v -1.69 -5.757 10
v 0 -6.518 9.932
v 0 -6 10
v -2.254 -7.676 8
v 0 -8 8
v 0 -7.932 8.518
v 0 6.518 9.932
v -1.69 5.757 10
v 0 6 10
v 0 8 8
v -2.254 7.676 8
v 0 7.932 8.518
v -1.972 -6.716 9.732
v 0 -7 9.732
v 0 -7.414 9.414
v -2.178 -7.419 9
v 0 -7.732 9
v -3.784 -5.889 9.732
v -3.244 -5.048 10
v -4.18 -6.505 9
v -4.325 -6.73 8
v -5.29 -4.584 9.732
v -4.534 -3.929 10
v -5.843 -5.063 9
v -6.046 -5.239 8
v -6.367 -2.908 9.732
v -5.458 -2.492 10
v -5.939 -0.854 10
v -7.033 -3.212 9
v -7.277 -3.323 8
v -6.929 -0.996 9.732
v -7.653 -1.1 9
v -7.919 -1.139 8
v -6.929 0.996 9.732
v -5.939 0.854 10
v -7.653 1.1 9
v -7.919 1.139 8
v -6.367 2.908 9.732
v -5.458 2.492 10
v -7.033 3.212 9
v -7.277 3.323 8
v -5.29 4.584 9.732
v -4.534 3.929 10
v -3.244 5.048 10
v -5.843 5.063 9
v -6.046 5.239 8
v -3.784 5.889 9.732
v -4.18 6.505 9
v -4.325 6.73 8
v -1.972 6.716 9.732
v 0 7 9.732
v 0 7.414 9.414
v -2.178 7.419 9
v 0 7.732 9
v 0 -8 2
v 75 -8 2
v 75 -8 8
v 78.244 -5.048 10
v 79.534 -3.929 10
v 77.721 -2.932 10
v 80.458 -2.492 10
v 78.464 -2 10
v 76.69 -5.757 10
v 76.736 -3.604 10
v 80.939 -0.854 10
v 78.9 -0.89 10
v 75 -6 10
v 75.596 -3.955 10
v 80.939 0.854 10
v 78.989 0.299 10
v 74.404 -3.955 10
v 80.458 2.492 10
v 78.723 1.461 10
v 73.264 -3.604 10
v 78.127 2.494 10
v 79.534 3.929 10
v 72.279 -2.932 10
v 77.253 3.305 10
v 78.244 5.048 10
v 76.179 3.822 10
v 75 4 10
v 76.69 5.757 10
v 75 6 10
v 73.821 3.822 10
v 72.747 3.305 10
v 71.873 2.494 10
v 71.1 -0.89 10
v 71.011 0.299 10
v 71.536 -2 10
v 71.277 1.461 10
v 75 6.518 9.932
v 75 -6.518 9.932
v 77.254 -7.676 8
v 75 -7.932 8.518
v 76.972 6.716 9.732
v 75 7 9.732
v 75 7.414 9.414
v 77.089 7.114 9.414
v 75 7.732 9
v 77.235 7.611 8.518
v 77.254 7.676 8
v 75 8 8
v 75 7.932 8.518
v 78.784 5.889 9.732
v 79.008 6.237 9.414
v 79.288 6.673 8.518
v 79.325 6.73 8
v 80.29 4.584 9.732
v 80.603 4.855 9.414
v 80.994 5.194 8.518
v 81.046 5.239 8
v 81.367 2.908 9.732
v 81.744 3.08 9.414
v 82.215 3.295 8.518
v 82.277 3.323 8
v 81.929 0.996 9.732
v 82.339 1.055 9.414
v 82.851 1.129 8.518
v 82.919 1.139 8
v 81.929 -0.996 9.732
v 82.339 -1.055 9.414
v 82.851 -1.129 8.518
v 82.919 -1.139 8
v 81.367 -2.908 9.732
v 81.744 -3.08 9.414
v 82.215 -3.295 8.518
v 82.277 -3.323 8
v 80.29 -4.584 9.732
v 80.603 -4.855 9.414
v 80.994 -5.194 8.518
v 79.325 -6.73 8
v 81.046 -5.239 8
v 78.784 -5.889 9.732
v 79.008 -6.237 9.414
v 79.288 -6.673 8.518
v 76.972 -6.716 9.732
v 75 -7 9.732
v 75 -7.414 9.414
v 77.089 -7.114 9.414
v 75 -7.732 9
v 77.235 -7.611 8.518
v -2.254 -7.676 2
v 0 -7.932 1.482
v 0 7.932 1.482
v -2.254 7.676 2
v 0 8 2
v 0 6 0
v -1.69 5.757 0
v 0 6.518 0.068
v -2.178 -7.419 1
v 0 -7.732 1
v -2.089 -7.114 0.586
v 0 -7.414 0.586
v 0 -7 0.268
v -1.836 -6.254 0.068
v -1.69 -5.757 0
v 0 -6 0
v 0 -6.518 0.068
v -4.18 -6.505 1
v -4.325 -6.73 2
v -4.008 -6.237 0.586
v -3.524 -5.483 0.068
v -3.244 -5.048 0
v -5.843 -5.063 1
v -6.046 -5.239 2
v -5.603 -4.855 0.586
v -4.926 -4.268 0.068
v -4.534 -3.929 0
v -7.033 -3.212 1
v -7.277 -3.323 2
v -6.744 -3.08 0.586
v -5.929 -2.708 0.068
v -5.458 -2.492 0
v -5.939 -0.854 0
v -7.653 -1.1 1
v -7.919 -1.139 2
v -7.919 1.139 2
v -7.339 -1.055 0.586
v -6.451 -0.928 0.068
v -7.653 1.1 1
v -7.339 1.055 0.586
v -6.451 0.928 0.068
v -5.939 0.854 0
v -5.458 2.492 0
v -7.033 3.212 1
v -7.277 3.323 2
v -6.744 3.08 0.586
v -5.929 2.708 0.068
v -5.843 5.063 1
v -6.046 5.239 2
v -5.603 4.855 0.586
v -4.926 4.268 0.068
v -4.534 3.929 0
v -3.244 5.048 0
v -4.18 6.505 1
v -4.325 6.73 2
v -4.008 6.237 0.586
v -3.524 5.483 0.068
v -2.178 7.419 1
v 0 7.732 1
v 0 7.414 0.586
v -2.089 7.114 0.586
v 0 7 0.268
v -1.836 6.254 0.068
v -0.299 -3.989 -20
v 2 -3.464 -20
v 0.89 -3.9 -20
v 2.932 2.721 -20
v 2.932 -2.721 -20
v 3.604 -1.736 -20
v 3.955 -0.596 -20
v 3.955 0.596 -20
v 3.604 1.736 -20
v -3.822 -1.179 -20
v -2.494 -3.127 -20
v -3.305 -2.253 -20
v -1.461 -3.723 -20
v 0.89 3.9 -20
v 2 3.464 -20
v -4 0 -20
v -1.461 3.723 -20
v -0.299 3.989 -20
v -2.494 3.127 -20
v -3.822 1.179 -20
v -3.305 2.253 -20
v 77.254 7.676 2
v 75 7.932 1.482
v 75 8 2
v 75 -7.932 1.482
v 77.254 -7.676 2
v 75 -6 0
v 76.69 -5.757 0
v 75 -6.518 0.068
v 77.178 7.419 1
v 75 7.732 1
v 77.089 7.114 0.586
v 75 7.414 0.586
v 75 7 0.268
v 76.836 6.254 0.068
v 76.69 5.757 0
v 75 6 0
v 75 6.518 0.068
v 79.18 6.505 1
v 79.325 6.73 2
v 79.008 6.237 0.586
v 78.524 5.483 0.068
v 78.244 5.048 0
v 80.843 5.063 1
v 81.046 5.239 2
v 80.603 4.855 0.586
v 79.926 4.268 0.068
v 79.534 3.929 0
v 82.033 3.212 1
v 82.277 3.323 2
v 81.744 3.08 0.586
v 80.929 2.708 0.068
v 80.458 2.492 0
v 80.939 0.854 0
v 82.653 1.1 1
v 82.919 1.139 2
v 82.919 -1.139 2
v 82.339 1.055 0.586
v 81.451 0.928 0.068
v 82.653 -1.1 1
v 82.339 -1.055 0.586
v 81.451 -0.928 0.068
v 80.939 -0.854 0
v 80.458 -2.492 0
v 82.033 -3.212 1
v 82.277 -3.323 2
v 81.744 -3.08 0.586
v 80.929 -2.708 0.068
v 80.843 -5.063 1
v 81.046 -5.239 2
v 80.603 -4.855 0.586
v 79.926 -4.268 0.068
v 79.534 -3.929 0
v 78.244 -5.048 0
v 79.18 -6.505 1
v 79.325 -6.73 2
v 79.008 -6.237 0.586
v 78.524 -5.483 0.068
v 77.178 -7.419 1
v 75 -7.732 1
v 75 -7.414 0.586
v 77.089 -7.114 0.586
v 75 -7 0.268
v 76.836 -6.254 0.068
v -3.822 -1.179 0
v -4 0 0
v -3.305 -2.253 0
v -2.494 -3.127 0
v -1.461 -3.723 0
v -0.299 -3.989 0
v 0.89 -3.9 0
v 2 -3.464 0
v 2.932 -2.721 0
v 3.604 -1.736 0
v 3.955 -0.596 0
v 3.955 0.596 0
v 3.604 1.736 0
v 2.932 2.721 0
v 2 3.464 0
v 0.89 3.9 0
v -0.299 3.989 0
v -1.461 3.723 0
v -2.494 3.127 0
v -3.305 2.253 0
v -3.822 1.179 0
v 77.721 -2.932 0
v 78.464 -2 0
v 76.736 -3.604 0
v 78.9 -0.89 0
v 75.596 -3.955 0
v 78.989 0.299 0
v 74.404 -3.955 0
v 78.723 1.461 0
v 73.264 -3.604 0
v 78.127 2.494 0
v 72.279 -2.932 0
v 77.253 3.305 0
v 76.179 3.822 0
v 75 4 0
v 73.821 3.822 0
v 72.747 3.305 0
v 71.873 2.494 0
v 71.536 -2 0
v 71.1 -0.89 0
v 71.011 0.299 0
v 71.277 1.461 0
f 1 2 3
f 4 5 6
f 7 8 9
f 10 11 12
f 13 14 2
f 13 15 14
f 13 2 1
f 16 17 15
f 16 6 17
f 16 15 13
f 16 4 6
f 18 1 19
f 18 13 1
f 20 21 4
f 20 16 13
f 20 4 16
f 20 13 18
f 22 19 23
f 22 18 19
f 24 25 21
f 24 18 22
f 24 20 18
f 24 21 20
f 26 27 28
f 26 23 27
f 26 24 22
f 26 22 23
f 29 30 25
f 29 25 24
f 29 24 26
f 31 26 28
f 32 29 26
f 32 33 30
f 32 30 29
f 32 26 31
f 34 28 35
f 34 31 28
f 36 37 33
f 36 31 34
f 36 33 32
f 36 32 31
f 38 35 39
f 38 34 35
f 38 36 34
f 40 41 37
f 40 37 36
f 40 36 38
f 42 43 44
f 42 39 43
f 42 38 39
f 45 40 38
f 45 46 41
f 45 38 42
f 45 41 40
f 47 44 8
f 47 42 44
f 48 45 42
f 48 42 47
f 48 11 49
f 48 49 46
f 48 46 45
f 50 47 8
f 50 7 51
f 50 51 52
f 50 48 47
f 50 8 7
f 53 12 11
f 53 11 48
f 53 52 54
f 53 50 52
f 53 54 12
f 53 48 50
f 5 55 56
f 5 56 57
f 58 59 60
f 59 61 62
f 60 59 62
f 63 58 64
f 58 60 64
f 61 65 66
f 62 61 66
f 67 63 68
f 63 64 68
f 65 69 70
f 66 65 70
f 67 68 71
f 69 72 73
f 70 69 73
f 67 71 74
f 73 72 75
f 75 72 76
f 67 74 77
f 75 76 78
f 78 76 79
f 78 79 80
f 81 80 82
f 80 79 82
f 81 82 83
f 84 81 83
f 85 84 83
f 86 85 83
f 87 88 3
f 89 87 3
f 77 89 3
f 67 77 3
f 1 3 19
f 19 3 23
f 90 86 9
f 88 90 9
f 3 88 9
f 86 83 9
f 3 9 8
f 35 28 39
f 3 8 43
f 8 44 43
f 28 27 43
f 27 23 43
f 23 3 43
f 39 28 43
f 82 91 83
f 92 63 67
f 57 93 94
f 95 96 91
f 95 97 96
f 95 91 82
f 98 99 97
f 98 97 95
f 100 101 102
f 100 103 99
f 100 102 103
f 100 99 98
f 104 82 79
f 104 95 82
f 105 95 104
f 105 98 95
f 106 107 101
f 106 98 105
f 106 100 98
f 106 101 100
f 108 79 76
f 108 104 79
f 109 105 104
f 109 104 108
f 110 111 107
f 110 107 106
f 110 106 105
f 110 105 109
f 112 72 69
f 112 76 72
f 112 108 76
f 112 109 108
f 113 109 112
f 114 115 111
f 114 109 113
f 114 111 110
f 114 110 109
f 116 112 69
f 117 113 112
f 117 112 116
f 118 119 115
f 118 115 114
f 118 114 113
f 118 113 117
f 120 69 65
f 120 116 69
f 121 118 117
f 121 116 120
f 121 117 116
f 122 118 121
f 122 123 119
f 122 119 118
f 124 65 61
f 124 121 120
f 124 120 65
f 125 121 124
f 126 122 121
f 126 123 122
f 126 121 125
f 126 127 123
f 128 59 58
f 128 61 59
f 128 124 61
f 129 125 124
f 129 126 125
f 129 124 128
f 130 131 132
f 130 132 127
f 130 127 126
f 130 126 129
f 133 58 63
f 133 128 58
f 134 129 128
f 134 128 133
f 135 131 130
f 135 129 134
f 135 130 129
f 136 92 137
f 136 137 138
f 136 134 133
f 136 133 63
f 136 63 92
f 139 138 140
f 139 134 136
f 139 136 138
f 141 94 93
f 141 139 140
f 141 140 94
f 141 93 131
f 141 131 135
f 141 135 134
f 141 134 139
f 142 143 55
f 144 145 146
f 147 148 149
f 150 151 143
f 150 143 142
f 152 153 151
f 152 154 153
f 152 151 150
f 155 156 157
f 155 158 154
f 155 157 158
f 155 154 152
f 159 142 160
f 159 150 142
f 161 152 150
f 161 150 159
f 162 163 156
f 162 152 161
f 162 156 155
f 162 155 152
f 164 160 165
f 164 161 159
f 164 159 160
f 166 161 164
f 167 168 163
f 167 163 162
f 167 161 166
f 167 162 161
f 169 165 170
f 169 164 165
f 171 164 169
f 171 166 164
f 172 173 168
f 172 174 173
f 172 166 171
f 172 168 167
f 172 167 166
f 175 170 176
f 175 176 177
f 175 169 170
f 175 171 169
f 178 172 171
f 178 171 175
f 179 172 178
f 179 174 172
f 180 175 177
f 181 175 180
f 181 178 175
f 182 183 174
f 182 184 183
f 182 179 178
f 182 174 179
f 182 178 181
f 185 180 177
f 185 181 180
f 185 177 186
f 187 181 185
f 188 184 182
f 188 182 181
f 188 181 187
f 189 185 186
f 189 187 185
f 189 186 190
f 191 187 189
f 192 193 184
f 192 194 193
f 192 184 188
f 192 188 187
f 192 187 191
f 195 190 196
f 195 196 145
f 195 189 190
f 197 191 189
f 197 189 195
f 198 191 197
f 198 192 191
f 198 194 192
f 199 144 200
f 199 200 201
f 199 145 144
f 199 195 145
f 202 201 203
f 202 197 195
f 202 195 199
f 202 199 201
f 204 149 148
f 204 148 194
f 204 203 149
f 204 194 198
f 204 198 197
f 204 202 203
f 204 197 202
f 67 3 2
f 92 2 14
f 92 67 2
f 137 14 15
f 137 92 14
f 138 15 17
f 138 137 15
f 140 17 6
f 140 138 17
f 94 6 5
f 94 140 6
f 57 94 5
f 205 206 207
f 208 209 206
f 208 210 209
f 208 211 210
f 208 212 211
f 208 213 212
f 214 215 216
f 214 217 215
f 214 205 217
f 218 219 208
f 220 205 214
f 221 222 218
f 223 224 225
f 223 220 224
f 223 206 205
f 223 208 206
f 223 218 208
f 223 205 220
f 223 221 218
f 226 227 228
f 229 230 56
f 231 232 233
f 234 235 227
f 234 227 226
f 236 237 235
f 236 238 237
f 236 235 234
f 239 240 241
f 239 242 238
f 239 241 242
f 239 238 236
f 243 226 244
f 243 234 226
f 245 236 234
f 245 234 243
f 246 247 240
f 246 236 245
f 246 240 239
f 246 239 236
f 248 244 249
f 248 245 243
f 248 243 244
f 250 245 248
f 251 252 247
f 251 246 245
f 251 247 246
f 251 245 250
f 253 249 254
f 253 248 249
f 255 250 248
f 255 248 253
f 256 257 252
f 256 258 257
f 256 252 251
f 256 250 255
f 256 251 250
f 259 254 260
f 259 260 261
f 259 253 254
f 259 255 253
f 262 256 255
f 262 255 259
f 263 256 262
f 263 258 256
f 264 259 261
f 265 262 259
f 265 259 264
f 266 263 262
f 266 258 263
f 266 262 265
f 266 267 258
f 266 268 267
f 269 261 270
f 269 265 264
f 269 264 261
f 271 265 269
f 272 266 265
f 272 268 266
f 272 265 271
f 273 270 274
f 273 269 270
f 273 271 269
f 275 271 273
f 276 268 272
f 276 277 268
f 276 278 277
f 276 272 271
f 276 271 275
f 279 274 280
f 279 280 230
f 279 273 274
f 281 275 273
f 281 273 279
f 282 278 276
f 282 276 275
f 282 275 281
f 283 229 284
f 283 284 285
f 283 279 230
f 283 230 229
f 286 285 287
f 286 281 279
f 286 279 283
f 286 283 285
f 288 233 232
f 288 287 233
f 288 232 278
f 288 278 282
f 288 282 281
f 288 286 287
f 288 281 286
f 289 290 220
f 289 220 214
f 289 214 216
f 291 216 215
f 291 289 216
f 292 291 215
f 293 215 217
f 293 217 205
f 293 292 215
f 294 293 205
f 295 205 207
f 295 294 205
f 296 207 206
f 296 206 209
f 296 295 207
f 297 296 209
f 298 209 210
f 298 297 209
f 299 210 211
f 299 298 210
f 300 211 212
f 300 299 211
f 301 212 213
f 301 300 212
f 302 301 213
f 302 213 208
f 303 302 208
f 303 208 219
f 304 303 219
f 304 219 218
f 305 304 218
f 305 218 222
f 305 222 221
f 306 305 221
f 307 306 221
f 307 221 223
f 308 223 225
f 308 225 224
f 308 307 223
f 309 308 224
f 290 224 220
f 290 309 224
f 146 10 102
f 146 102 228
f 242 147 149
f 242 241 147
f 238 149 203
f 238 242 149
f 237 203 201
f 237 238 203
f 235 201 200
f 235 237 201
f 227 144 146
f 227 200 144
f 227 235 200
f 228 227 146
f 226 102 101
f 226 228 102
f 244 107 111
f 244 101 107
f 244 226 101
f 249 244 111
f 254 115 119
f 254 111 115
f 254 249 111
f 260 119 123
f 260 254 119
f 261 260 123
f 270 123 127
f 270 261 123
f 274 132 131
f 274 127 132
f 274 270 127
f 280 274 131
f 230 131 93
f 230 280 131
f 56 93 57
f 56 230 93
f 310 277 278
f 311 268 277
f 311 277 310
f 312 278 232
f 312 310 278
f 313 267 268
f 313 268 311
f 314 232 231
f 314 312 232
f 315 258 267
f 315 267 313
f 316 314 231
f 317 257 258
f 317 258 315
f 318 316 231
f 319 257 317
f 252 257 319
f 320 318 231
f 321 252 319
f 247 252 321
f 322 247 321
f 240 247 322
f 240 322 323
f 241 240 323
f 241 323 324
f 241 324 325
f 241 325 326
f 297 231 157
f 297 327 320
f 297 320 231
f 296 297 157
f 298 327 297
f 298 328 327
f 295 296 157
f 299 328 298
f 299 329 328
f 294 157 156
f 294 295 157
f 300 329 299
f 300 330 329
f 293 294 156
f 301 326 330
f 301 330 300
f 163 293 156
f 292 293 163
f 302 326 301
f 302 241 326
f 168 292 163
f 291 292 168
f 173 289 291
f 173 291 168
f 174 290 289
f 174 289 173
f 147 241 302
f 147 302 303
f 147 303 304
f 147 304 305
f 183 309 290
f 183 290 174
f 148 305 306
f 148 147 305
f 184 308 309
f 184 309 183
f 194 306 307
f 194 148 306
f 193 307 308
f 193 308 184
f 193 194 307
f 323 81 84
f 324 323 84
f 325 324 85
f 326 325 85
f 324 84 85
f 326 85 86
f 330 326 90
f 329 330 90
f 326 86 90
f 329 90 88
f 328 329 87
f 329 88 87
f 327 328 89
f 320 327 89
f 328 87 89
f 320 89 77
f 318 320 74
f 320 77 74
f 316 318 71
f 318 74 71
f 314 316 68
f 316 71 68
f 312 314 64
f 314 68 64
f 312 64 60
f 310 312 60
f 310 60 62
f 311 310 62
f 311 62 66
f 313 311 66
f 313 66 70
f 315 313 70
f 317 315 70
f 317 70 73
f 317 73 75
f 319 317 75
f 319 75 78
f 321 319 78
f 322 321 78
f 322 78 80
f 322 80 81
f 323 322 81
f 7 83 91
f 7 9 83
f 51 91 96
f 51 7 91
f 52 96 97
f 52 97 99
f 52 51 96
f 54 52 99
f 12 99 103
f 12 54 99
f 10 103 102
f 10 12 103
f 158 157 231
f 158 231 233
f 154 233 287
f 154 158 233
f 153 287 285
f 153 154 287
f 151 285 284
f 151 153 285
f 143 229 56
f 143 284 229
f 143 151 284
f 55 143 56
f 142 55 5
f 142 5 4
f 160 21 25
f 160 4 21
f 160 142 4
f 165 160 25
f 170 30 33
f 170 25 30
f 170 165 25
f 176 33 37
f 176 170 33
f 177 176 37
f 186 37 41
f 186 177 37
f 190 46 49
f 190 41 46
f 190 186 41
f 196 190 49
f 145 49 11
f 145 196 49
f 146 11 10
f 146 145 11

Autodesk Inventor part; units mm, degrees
ref_plane "XZ Plane" through (0, 0, 0) normal (0, 1, 0) x (-1, 0, 0)
ref_plane "XY Plane" through (0, 0, 0) normal (0, 0, 1) x (1, 0, 0)
sketch "Sketch1" plane through (0, 0, 0) normal (0, 0, 1) x (1, 0, 0)
  circle A0 centre (0, 0) radius 8
  dimension "d0" = 16
extrude "Extrusion1" add sketch "Sketch1" along normal blind 10
ref_plane "Work Plane1" through (8, 0, 0) normal (1, 0, 0) x (0, 1, 0)
sketch "Sketch2" plane through (8, 0, 0) normal (1, 0, 0) x (0, 1, 0)
  line L0 (8, 10) -> (-8, 10) projected
  line L1 (8, 0) -> (-8, 0) projected
  line L2 (8, 0) -> (-8, 0) projected
  line L3 (-8, 10) -> (8, 10)
  line L4 (8, 10) -> (8, 0)
  line L5 (8, 0) -> (-8, 0)
  line L6 (-8, 0) -> (-8, 10)
  line L7 (-8, 10) -> (8, 0) construction
  line L8 (8, 10) -> (-8, 0) construction
  point P0 (0, 0)
  point P1 (0, 5)
extrude "Extrusion2" add sketch "Sketch2" along normal blind 67 and the other way blind 8
sketch "Sketch3" plane through (0, 0, 0) normal (0, 0, -1) x (-1, 0, 0)
  line L0 (0, 0) -> (-75, 0)
  line L1 (-75, -8) -> (-75, 8) projected
  circle A0 centre (-75, 0) radius 8
  dimension "d8" = 75
extrude "Extrusion3" add sketch "Sketch3" against normal blind 10 contours L1 A0
sketch "Sketch4" plane through (0, 0, 0) normal (0, 0, -1) x (-1, 0, 0)
  line L0 (0, 0) -> (-75, 0)
  line L1 (0, -8) -> (-75, -8) projected
  line L2 (0, 0) -> (75, 0) construction
  circle A0 centre (-75, 0) radius 4
  circle A1 centre (0, 0) radius 4
  dimension "d11" = 75
  dimension "d12" = 180
  dimension "d14" = 8
  dimension "d15" = 8
extrude "Extrusion4" add sketch "Sketch4" along normal blind 20 contours A1
hole "Hole1" at (75, 0, 0) direction (0, 0, 1) diameter 8 end through all
ref_plane "Work Plane2" through (68, 0, 0) normal (1, 0, 0) x (0, 1, 0)
sketch "Sketch6" plane through (68, 0, 0) normal (1, 0, 0) x (0, 1, 0)
  line L0 (-8, 0) -> (-8, 10) projected
  line L1 (8, 7.5) -> (-8, 7.5)
  line L2 (-8, 7.5) -> (-8, 2.5)
  line L3 (-8, 2.5) -> (8, 2.5)
  line L4 (8, 2.5) -> (8, 7.5)
  line L5 (8, 7.5) -> (-8, 2.5) construction
  line L6 (-8, 7.5) -> (8, 2.5) construction
  point P0 (0, 0)
  point P1 (0, 5)
  dimension "d28" = 5
extrude "Extrusion6" [suppressed]
fillet "Fillet1" radius 2 8 edges at (-8, 0, 10) (37.5, -8, 10) (83, 0, 10) (37.5, 8, 10) (83, 0, 0) (37.5, -8, 0) (-8, 0, 0) (37.5, 8, 0)
properties part number "Manivela" material "Iron, Ductile"
